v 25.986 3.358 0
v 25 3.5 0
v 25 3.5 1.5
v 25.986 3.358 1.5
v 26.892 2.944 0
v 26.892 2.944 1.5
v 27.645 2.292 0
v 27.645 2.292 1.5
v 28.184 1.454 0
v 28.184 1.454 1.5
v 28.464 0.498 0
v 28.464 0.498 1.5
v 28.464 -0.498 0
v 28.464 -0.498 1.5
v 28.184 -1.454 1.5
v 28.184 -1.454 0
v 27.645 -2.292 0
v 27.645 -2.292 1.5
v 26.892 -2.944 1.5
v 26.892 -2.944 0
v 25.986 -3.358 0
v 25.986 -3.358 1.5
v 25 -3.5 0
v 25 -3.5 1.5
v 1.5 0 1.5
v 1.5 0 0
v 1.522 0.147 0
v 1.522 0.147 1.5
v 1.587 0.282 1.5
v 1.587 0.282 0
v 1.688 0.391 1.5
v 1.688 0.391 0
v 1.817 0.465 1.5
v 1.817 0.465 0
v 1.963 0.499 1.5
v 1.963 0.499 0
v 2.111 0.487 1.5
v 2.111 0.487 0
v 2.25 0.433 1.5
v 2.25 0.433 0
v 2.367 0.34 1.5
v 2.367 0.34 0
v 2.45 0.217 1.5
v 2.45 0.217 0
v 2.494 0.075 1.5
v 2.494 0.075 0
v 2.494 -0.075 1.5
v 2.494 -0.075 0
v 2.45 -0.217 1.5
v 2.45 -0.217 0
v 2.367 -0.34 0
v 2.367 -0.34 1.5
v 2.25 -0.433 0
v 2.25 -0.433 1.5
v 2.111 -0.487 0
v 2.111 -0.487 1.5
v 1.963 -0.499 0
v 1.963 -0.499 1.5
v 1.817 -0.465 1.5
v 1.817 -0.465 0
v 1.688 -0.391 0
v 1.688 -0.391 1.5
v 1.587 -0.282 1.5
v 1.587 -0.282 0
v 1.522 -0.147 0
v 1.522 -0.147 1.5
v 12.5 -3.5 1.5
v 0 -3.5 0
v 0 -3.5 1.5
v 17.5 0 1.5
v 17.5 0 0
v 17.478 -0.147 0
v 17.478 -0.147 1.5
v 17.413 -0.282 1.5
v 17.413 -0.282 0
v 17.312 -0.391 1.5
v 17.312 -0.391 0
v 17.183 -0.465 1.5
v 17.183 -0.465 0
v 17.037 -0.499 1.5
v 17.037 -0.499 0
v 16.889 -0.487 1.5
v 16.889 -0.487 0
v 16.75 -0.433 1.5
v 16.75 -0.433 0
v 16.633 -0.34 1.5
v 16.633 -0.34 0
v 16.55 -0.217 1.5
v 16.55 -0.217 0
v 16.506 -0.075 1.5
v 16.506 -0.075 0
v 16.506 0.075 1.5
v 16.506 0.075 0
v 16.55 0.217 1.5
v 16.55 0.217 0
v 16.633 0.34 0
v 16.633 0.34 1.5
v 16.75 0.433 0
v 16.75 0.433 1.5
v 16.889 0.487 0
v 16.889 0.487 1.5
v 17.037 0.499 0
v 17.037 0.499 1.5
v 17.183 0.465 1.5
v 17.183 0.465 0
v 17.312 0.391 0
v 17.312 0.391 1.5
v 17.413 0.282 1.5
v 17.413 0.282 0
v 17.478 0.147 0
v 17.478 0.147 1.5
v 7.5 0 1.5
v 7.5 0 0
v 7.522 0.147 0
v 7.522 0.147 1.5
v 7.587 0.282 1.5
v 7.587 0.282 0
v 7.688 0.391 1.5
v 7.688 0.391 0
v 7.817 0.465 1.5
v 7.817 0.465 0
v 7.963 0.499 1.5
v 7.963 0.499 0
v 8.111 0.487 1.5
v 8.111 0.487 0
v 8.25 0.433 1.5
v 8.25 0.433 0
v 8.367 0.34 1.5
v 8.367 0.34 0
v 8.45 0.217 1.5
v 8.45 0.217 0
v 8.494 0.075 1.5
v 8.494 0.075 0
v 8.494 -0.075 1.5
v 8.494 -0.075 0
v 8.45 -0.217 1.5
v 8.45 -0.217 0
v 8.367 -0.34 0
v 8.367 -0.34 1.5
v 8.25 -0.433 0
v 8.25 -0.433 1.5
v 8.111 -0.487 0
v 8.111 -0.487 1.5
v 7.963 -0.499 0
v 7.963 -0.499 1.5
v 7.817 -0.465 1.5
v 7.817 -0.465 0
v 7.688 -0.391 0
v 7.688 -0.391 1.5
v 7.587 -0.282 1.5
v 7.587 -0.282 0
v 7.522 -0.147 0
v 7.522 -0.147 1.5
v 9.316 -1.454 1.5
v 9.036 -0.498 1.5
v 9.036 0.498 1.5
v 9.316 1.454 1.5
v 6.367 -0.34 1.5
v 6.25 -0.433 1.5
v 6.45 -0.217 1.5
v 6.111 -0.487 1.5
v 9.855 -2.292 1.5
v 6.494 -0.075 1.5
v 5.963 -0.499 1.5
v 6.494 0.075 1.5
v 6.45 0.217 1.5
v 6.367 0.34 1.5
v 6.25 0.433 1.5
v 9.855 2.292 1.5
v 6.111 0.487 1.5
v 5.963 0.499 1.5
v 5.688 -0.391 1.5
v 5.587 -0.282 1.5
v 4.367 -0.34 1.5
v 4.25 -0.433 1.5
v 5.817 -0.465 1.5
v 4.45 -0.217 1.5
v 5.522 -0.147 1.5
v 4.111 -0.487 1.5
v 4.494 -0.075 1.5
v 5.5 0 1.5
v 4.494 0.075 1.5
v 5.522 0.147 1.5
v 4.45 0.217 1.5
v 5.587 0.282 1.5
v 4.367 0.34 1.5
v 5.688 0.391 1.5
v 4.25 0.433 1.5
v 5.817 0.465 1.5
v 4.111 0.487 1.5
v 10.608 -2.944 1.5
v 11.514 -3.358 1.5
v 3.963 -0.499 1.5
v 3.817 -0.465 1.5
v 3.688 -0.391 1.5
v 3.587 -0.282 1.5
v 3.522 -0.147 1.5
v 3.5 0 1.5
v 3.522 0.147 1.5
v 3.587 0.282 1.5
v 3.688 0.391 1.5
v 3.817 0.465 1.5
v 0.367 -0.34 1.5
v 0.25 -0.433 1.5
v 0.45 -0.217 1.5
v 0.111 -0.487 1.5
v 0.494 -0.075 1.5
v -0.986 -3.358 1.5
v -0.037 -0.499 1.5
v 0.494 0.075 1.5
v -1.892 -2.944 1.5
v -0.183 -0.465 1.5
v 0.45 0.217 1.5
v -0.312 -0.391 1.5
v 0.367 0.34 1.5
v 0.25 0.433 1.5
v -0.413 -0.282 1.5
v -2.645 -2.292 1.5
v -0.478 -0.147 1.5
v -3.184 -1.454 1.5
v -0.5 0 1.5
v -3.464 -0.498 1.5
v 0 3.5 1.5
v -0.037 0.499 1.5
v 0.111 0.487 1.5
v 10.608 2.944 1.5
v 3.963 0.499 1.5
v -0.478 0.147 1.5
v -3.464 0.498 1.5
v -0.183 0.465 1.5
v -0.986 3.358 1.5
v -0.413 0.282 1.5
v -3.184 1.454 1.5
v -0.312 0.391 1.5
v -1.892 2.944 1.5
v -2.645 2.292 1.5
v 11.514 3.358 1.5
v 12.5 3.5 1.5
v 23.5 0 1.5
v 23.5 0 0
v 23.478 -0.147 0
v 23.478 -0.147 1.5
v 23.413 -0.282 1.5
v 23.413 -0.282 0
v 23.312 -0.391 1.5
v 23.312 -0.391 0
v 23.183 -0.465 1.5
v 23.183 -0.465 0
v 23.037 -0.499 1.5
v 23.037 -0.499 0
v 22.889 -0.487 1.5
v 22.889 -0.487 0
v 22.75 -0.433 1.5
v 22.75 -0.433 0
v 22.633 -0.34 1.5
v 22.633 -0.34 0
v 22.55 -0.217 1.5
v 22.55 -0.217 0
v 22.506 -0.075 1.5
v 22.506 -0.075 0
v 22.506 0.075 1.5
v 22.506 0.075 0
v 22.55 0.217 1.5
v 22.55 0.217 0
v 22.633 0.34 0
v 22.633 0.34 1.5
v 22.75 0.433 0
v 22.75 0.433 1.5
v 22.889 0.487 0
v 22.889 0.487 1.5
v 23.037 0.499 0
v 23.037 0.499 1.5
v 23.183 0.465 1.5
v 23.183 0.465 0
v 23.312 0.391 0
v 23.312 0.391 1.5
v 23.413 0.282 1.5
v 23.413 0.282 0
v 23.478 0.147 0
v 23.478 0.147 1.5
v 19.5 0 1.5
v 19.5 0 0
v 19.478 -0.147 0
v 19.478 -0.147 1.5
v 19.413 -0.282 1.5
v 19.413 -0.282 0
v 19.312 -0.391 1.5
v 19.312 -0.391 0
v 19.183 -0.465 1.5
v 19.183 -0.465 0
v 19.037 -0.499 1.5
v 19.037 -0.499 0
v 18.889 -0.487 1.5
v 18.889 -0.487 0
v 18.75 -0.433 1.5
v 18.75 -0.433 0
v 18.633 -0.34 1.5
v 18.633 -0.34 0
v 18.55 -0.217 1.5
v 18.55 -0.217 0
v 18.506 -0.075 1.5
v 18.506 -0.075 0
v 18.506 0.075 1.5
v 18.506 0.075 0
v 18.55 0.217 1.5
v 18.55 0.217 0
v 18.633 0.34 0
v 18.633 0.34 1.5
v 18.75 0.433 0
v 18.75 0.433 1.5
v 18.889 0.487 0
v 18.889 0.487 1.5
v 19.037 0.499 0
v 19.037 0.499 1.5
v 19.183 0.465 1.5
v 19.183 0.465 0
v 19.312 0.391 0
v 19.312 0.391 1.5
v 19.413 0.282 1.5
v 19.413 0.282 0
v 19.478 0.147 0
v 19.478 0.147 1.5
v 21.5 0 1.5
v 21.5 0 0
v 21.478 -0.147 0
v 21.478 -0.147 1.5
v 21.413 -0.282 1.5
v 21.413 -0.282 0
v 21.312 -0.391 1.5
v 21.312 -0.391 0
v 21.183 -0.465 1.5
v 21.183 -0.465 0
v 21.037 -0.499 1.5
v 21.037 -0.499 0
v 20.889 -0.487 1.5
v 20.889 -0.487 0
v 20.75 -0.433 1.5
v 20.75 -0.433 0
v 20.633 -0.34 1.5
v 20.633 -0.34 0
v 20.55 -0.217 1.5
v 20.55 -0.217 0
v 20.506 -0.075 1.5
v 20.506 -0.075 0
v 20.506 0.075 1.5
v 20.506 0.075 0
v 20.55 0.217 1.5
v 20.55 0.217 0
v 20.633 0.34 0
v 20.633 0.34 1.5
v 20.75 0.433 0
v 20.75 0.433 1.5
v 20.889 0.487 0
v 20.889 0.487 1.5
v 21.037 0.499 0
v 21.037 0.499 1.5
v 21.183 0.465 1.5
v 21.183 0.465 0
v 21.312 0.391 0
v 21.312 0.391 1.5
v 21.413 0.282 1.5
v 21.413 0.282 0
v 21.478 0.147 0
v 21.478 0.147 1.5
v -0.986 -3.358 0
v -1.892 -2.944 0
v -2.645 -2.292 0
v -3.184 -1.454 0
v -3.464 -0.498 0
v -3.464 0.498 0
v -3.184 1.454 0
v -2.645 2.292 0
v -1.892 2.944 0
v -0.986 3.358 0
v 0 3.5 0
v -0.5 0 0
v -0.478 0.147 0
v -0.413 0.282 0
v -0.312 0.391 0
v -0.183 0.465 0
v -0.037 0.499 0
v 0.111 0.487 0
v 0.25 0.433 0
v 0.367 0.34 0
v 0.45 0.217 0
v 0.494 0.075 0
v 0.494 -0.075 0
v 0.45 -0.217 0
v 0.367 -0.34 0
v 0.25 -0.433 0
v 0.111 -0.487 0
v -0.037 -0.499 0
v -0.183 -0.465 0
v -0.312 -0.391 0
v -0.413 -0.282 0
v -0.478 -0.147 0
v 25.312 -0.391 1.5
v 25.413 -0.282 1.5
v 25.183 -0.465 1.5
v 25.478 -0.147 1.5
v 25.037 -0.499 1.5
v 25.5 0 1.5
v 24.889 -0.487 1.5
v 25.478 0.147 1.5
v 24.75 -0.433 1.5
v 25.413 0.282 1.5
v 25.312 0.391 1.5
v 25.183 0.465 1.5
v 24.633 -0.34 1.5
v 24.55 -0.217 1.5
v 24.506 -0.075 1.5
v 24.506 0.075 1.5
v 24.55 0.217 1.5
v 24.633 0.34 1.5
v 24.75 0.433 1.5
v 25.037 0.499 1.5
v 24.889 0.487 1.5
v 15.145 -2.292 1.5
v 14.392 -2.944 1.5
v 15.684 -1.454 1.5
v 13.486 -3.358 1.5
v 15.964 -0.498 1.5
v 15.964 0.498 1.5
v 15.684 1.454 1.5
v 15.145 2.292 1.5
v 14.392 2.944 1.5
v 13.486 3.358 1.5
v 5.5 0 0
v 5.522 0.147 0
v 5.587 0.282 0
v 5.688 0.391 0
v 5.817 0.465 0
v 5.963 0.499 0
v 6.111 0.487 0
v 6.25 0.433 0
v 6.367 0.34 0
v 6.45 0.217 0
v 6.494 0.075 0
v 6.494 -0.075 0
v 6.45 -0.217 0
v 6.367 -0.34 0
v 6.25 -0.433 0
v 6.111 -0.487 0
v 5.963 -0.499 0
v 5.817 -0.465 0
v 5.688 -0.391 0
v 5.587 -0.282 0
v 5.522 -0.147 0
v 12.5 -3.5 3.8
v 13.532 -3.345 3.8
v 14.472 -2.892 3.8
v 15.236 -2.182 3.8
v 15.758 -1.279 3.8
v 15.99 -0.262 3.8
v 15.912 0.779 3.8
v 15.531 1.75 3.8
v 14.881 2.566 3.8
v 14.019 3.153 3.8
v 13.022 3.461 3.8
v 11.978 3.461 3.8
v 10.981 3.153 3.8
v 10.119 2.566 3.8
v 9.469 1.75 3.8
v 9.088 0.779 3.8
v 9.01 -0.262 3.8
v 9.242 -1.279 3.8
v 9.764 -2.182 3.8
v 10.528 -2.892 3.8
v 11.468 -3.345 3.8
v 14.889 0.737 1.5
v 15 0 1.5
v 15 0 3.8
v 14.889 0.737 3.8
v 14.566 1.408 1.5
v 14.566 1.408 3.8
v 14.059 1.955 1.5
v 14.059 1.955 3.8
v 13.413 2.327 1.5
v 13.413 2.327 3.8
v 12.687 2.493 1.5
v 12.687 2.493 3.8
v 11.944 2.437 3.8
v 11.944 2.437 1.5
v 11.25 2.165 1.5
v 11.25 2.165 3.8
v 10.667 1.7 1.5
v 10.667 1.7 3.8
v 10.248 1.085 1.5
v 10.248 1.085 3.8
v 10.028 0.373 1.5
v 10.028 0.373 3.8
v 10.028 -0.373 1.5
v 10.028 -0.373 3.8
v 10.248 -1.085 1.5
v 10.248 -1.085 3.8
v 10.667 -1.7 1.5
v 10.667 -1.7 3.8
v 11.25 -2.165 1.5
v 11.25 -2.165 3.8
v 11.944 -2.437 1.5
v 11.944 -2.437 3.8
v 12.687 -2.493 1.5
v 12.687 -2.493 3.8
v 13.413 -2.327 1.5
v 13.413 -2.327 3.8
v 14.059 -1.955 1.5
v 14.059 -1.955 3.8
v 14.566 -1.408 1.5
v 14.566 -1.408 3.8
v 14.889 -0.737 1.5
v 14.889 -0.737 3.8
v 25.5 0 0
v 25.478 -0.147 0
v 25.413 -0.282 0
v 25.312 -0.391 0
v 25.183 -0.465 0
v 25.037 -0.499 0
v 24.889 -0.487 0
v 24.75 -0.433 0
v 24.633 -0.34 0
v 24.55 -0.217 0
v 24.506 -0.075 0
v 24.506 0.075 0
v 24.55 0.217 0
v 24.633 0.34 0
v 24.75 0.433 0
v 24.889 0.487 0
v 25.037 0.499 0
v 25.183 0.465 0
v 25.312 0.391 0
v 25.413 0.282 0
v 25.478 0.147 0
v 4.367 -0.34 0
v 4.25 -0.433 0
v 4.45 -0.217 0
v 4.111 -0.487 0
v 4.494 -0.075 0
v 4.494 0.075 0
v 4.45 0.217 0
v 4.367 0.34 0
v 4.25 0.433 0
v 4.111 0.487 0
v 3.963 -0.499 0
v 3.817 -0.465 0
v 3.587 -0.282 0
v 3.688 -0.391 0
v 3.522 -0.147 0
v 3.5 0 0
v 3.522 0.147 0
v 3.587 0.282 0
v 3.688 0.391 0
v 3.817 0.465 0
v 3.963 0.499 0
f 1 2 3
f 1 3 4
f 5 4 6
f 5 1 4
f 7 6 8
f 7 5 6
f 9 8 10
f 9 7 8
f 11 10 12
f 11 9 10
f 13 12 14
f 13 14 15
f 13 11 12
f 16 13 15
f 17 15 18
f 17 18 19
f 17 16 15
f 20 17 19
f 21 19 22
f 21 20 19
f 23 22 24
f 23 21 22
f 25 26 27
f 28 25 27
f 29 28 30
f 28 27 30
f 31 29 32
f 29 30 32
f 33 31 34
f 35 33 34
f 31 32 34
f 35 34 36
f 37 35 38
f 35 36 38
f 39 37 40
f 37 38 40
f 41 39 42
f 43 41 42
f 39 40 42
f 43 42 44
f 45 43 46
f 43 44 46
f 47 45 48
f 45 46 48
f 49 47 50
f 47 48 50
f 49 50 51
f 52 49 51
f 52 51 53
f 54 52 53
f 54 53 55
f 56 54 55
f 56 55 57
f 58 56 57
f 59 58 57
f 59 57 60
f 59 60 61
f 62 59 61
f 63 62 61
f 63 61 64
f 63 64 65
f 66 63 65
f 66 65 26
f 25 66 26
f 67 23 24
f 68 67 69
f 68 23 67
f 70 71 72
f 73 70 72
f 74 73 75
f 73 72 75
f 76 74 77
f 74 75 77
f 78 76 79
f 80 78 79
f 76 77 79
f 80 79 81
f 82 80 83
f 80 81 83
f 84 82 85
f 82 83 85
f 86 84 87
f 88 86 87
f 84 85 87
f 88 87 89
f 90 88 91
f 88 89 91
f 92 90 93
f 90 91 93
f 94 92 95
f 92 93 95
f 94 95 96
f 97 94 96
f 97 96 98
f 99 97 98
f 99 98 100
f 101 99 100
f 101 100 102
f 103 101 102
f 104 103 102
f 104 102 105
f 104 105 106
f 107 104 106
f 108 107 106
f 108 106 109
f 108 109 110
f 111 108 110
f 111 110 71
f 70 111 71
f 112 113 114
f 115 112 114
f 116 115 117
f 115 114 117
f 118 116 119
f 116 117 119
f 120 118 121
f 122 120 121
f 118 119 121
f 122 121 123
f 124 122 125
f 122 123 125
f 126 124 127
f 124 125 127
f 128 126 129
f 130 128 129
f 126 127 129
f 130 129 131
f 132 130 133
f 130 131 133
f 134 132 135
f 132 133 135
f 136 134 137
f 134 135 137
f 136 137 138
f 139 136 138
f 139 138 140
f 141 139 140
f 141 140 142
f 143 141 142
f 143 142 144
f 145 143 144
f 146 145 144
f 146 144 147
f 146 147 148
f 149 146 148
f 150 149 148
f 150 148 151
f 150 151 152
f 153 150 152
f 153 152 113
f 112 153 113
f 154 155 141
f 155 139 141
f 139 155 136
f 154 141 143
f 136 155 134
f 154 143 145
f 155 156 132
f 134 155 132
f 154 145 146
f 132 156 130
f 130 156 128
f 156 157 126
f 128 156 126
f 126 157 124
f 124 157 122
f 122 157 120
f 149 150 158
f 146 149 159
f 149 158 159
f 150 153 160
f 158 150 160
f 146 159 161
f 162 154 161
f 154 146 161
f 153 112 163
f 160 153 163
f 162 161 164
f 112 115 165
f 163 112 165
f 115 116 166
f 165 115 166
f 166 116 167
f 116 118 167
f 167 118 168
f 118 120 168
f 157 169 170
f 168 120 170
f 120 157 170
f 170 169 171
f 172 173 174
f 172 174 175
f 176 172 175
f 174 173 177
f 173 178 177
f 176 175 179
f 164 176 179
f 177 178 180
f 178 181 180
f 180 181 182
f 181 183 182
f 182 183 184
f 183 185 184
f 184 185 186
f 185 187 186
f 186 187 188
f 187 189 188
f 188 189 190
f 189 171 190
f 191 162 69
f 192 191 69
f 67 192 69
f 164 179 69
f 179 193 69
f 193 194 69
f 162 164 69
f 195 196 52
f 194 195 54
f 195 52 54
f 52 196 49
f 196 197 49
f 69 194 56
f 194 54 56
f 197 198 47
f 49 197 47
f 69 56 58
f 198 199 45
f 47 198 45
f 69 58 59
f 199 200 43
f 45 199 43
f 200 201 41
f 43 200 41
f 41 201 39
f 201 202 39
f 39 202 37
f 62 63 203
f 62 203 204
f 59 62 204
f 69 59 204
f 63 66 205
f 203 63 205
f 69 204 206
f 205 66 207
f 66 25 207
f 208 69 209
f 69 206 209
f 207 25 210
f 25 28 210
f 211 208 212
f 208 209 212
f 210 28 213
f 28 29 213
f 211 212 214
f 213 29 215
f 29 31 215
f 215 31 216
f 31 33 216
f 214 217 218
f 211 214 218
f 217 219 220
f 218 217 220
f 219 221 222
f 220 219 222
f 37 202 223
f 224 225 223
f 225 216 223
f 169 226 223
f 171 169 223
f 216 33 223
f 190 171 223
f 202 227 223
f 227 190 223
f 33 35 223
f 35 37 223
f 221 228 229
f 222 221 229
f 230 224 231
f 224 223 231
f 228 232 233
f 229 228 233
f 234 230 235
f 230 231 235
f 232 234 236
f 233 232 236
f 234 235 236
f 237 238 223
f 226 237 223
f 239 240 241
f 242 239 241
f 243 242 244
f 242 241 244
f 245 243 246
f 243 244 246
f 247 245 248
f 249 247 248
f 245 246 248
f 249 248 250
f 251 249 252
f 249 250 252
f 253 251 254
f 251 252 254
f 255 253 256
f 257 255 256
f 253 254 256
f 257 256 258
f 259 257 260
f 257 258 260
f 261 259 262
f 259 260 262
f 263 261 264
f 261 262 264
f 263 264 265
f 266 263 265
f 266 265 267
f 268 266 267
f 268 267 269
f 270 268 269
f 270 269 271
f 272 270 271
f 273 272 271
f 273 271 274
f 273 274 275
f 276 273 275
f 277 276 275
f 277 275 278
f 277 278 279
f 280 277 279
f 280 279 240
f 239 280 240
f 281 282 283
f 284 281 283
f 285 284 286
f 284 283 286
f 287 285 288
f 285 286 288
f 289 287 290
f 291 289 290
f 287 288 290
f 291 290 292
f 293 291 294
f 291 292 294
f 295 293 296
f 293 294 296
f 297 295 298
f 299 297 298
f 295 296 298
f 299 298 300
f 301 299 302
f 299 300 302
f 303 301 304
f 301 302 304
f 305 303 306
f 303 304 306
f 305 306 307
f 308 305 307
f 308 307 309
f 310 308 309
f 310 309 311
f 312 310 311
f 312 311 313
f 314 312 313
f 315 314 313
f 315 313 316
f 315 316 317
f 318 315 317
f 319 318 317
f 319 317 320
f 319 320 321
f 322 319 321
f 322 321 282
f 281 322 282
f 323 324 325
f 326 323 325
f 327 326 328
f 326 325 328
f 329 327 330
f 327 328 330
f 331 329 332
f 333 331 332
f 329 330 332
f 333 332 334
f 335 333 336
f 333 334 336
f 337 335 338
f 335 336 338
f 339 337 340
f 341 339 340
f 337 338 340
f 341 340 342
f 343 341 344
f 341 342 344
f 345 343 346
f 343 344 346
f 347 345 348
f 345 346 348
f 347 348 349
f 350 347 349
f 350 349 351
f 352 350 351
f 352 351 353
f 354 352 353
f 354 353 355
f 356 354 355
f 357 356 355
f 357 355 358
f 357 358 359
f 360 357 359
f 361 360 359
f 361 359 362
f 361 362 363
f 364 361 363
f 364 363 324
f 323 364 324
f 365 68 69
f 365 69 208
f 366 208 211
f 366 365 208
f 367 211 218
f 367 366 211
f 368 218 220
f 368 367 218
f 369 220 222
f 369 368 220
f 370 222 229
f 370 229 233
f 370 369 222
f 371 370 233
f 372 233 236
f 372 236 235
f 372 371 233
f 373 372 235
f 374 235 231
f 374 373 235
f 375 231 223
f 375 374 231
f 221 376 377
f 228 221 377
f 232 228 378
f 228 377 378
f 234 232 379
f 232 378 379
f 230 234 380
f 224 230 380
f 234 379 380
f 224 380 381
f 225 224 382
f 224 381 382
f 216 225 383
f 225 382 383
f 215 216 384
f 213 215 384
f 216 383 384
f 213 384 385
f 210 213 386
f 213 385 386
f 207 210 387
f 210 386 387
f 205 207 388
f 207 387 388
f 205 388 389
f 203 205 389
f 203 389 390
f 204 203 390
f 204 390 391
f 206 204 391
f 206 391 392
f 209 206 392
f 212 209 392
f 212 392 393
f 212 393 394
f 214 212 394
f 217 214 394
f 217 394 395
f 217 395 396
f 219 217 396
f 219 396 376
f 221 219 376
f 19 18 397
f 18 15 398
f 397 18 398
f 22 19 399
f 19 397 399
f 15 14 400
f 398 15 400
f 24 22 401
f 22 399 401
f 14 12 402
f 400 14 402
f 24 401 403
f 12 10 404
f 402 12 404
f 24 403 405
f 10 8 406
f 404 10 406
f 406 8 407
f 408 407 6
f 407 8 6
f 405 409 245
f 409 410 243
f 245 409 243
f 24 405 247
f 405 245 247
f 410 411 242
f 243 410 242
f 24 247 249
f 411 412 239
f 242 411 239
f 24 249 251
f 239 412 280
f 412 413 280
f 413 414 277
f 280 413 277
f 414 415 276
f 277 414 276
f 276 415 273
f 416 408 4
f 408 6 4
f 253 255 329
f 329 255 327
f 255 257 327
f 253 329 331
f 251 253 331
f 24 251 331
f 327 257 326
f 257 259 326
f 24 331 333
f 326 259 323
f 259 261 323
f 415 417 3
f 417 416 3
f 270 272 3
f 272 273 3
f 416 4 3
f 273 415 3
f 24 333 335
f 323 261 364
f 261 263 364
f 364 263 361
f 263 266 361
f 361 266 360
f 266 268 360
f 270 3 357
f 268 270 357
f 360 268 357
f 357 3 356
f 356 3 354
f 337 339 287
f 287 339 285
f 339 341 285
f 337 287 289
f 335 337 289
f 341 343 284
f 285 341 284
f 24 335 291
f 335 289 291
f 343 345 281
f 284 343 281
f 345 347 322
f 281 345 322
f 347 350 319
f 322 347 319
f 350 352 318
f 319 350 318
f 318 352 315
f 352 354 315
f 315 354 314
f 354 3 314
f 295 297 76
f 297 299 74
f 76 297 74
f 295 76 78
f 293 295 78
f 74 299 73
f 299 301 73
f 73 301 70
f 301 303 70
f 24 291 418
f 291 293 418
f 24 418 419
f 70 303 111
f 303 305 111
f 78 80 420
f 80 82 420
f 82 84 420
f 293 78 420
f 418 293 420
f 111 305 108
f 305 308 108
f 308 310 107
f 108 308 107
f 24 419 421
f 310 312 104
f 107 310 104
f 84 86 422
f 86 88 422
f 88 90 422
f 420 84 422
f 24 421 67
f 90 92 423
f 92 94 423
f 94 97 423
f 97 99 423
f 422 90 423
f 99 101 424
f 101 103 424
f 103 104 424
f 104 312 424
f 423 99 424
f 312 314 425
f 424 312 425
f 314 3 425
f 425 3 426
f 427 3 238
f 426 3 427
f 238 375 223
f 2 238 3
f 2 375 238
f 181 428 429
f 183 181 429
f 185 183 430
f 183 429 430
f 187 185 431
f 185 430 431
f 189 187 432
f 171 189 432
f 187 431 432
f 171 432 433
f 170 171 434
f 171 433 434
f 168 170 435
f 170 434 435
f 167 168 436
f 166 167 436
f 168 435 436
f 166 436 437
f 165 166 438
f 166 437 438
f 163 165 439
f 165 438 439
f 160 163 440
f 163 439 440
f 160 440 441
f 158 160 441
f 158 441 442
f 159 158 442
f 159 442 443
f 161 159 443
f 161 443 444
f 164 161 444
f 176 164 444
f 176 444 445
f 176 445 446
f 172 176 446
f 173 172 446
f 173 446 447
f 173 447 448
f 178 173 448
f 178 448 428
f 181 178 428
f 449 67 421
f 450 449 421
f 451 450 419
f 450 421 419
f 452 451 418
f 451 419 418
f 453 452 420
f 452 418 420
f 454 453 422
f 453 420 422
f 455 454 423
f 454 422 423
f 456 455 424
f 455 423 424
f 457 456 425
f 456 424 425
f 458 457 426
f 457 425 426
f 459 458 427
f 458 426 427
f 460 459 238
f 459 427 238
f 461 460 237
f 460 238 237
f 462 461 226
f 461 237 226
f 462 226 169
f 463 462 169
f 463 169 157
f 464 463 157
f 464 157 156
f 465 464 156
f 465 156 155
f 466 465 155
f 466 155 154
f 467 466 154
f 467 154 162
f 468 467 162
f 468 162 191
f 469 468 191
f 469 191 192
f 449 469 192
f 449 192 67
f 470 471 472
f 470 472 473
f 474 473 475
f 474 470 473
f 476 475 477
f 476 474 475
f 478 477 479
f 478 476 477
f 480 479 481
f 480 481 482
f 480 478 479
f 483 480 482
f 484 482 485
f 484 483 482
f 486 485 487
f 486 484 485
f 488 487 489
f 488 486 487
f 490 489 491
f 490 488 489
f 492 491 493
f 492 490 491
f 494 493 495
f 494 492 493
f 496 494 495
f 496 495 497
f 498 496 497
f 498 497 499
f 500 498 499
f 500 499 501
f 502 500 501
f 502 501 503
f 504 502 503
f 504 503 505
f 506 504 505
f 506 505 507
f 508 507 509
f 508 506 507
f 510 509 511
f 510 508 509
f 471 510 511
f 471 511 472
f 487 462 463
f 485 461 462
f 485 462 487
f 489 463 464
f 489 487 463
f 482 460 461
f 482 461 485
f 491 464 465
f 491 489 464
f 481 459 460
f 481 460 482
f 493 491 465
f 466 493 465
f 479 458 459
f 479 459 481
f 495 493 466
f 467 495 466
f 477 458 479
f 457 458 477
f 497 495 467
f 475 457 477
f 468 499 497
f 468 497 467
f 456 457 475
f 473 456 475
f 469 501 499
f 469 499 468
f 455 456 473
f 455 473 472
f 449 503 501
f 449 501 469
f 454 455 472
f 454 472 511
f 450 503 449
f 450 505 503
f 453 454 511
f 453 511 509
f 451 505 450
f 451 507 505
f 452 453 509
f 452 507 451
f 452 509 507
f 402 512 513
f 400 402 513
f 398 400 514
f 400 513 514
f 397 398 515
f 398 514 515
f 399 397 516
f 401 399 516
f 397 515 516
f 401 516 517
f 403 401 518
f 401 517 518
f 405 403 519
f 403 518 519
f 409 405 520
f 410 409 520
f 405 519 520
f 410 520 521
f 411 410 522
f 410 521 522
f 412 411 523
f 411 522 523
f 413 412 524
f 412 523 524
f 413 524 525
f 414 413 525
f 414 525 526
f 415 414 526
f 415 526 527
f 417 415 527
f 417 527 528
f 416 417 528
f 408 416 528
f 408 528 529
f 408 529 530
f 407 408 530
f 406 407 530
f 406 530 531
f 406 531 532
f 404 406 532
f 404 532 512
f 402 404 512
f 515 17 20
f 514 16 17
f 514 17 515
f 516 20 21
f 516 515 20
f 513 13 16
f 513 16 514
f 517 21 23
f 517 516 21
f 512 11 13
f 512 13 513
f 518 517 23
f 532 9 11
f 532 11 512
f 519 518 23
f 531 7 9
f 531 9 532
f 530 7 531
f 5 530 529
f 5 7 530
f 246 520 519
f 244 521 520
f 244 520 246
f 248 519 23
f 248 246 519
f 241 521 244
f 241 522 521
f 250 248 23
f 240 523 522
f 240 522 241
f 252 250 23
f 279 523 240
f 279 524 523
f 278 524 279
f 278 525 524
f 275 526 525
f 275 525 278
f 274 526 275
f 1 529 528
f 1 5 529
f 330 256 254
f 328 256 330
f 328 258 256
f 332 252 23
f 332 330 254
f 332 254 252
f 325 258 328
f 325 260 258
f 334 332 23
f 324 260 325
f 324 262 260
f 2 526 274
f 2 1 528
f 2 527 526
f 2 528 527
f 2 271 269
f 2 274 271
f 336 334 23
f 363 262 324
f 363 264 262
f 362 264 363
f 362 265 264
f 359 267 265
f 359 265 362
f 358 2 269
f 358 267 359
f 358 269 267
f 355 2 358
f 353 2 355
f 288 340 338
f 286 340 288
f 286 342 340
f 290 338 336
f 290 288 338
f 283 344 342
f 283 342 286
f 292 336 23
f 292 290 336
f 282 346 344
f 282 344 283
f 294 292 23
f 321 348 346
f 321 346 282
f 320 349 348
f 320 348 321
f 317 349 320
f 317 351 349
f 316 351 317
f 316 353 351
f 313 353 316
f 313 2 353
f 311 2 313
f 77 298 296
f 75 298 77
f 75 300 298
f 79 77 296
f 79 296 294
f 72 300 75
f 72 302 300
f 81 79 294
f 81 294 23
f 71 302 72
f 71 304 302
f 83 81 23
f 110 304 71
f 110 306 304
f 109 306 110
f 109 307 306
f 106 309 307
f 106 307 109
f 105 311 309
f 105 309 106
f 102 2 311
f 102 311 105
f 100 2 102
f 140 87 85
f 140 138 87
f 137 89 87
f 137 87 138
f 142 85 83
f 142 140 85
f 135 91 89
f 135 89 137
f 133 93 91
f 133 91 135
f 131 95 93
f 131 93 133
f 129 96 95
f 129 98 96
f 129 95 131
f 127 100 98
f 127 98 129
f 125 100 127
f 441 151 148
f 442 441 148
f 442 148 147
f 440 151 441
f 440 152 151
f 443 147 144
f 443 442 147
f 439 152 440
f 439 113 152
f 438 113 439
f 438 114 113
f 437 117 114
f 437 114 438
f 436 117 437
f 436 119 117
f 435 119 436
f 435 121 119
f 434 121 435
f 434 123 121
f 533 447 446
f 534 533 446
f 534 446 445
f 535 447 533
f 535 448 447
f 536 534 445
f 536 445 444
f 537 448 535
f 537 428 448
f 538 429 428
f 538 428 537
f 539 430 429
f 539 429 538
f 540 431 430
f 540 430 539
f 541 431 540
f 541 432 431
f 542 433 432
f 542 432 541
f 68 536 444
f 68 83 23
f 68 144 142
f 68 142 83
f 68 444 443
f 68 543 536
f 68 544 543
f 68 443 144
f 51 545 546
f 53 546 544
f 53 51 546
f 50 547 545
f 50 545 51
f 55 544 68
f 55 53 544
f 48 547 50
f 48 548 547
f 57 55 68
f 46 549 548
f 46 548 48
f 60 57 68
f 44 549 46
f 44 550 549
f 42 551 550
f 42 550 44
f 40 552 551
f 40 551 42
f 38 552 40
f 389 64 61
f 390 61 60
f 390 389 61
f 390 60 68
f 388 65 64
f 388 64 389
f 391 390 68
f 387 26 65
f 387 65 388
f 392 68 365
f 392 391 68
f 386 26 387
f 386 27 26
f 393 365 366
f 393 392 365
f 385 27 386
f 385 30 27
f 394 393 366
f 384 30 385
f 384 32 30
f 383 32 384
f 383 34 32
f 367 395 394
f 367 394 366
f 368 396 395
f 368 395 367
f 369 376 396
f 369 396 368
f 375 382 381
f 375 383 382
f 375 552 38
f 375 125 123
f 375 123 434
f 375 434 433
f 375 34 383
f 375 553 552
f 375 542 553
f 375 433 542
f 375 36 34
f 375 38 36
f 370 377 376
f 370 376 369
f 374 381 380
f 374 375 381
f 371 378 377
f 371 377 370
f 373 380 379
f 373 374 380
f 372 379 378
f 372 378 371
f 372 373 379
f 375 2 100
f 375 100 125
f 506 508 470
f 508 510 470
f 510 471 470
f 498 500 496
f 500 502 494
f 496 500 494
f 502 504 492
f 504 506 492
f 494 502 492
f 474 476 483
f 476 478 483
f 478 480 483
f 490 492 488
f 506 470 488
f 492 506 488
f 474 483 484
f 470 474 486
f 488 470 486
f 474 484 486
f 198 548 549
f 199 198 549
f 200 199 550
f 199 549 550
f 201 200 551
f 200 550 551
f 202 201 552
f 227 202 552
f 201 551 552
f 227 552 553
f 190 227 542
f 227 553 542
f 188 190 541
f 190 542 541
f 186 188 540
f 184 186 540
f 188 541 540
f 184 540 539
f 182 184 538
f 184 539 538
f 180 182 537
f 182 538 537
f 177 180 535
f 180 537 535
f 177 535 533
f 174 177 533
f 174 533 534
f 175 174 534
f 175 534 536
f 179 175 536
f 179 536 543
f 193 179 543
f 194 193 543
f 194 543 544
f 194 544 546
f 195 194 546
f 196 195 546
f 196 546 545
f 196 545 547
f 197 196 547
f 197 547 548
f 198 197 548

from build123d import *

# Parameters (mm, degrees)
SALIENTE_EXTRUIR1_DEPTH = 1.5
CROQUIS2_R              = 3.5
CROQUIS2_R_2            = 2.5
SALIENTE_EXTRUIR2_DEPTH = 2.3
CROQUIS4_R              = 0.5
CORTAR_EXTRUIR1_DEPTH   = 29.964460982
CORTAR_EXTRUIR2_REACH   = 30.964
CROQUIS5_R              = 0.5


with BuildPart() as part:
    # Croquis1 → Saliente-Extruir1 (new body)
    with BuildSketch(Plane.XY):
        with BuildLine():
            Line((0, 3.5), (25, 3.5))
            ThreePointArc((25, 3.5), (28.5, 0), (25, -3.5))
            Line((25, -3.5), (0, -3.5))
            ThreePointArc((0, -3.5), (-3.5, 0), (0, 3.5))
        make_face()
    extrude(amount=SALIENTE_EXTRUIR1_DEPTH)

    # Croquis2 → Saliente-Extruir2 (add)
    with BuildSketch(Plane.XY.offset(1.5)):
        with Locations(Location((12.5, 0, 0), (0, 0, 270))):
            Circle(CROQUIS2_R)
        with Locations((12.5, 0)):
            Circle(CROQUIS2_R_2, mode=Mode.SUBTRACT)
    extrude(amount=SALIENTE_EXTRUIR2_DEPTH)

    # Croquis4 → Cortar-Extruir1 (cut, through all)
    with BuildSketch(Plane(origin=(0, 0, 0), x_dir=(-1, 0, 0), z_dir=(0, 0, -1))):
        Circle(CROQUIS4_R)
        with Locations(Location((-25, 0, 0), (0, 0, 180))):
            Circle(CROQUIS4_R)
    extrude(amount=-CORTAR_EXTRUIR1_DEPTH, mode=Mode.SUBTRACT)

    # Croquis5 → Cortar-Extruir2 (cut, up to next)
    with BuildSketch(Plane(origin=(0, 0, 0), x_dir=(-1, 0, 0), z_dir=(0, 0, -1)), mode=Mode.PRIVATE) as cortar_extruir2_sk1:
        with Locations((-8, 0)):
            Circle(CROQUIS5_R)
    cortar_extruir2_tool1 = extrude(cortar_extruir2_sk1.sketch, amount=-CORTAR_EXTRUIR2_REACH, mode=Mode.PRIVATE) & part.part
    # Croquis5 → Cortar-Extruir2 (cut, up to next)
    with BuildSketch(Plane(origin=(0, 0, 0), x_dir=(-1, 0, 0), z_dir=(0, 0, -1)), mode=Mode.PRIVATE) as cortar_extruir2_sk2:
        with Locations((-6, 0)):
            Circle(CROQUIS5_R)
    cortar_extruir2_tool2 = extrude(cortar_extruir2_sk2.sketch, amount=-CORTAR_EXTRUIR2_REACH, mode=Mode.PRIVATE) & part.part
    # Croquis5 → Cortar-Extruir2 (cut, up to next)
    with BuildSketch(Plane(origin=(0, 0, 0), x_dir=(-1, 0, 0), z_dir=(0, 0, -1)), mode=Mode.PRIVATE) as cortar_extruir2_sk3:
        with Locations((-4, 0)):
            Circle(CROQUIS5_R)
    cortar_extruir2_tool3 = extrude(cortar_extruir2_sk3.sketch, amount=-CORTAR_EXTRUIR2_REACH, mode=Mode.PRIVATE) & part.part
    # Croquis5 → Cortar-Extruir2 (cut, up to next)
    with BuildSketch(Plane(origin=(0, 0, 0), x_dir=(-1, 0, 0), z_dir=(0, 0, -1)), mode=Mode.PRIVATE) as cortar_extruir2_sk4:
        with Locations((-2, 0)):
            Circle(CROQUIS5_R)
    cortar_extruir2_tool4 = extrude(cortar_extruir2_sk4.sketch, amount=-CORTAR_EXTRUIR2_REACH, mode=Mode.PRIVATE) & part.part
    # Croquis5 → Cortar-Extruir2 (cut, up to next)
    with BuildSketch(Plane(origin=(0, 0, 0), x_dir=(-1, 0, 0), z_dir=(0, 0, -1)), mode=Mode.PRIVATE) as cortar_extruir2_sk5:
        with Locations(Location((-23, 0, 0), (0, 0, 180))):
            Circle(CROQUIS5_R)
    cortar_extruir2_tool5 = extrude(cortar_extruir2_sk5.sketch, amount=-CORTAR_EXTRUIR2_REACH, mode=Mode.PRIVATE) & part.part
    # Croquis5 → Cortar-Extruir2 (cut, up to next)
    with BuildSketch(Plane(origin=(0, 0, 0), x_dir=(-1, 0, 0), z_dir=(0, 0, -1)), mode=Mode.PRIVATE) as cortar_extruir2_sk6:
        with Locations(Location((-21, 0, 0), (0, 0, 180))):
            Circle(CROQUIS5_R)
    cortar_extruir2_tool6 = extrude(cortar_extruir2_sk6.sketch, amount=-CORTAR_EXTRUIR2_REACH, mode=Mode.PRIVATE) & part.part
    # Croquis5 → Cortar-Extruir2 (cut, up to next)
    with BuildSketch(Plane(origin=(0, 0, 0), x_dir=(-1, 0, 0), z_dir=(0, 0, -1)), mode=Mode.PRIVATE) as cortar_extruir2_sk7:
        with Locations(Location((-19, 0, 0), (0, 0, 180))):
            Circle(CROQUIS5_R)
    cortar_extruir2_tool7 = extrude(cortar_extruir2_sk7.sketch, amount=-CORTAR_EXTRUIR2_REACH, mode=Mode.PRIVATE) & part.part
    # Croquis5 → Cortar-Extruir2 (cut, up to next)
    with BuildSketch(Plane(origin=(0, 0, 0), x_dir=(-1, 0, 0), z_dir=(0, 0, -1)), mode=Mode.PRIVATE) as cortar_extruir2_sk8:
        with Locations(Location((-17, 0, 0), (0, 0, 180))):
            Circle(CROQUIS5_R)
    cortar_extruir2_tool8 = extrude(cortar_extruir2_sk8.sketch, amount=-CORTAR_EXTRUIR2_REACH, mode=Mode.PRIVATE) & part.part
    add(cortar_extruir2_tool1.solids().sort_by_distance((8, 0, 0))[0], mode=Mode.SUBTRACT)
    add(cortar_extruir2_tool2.solids().sort_by_distance((6, 0, 0))[0], mode=Mode.SUBTRACT)
    add(cortar_extruir2_tool3.solids().sort_by_distance((4, 0, 0))[0], mode=Mode.SUBTRACT)
    add(cortar_extruir2_tool4.solids().sort_by_distance((2, 0, 0))[0], mode=Mode.SUBTRACT)
    add(cortar_extruir2_tool5.solids().sort_by_distance((23, 0, 0))[0], mode=Mode.SUBTRACT)
    add(cortar_extruir2_tool6.solids().sort_by_distance((21, 0, 0))[0], mode=Mode.SUBTRACT)
    add(cortar_extruir2_tool7.solids().sort_by_distance((19, 0, 0))[0], mode=Mode.SUBTRACT)
    add(cortar_extruir2_tool8.solids().sort_by_distance((17, 0, 0))[0], mode=Mode.SUBTRACT)


solid = part.part
